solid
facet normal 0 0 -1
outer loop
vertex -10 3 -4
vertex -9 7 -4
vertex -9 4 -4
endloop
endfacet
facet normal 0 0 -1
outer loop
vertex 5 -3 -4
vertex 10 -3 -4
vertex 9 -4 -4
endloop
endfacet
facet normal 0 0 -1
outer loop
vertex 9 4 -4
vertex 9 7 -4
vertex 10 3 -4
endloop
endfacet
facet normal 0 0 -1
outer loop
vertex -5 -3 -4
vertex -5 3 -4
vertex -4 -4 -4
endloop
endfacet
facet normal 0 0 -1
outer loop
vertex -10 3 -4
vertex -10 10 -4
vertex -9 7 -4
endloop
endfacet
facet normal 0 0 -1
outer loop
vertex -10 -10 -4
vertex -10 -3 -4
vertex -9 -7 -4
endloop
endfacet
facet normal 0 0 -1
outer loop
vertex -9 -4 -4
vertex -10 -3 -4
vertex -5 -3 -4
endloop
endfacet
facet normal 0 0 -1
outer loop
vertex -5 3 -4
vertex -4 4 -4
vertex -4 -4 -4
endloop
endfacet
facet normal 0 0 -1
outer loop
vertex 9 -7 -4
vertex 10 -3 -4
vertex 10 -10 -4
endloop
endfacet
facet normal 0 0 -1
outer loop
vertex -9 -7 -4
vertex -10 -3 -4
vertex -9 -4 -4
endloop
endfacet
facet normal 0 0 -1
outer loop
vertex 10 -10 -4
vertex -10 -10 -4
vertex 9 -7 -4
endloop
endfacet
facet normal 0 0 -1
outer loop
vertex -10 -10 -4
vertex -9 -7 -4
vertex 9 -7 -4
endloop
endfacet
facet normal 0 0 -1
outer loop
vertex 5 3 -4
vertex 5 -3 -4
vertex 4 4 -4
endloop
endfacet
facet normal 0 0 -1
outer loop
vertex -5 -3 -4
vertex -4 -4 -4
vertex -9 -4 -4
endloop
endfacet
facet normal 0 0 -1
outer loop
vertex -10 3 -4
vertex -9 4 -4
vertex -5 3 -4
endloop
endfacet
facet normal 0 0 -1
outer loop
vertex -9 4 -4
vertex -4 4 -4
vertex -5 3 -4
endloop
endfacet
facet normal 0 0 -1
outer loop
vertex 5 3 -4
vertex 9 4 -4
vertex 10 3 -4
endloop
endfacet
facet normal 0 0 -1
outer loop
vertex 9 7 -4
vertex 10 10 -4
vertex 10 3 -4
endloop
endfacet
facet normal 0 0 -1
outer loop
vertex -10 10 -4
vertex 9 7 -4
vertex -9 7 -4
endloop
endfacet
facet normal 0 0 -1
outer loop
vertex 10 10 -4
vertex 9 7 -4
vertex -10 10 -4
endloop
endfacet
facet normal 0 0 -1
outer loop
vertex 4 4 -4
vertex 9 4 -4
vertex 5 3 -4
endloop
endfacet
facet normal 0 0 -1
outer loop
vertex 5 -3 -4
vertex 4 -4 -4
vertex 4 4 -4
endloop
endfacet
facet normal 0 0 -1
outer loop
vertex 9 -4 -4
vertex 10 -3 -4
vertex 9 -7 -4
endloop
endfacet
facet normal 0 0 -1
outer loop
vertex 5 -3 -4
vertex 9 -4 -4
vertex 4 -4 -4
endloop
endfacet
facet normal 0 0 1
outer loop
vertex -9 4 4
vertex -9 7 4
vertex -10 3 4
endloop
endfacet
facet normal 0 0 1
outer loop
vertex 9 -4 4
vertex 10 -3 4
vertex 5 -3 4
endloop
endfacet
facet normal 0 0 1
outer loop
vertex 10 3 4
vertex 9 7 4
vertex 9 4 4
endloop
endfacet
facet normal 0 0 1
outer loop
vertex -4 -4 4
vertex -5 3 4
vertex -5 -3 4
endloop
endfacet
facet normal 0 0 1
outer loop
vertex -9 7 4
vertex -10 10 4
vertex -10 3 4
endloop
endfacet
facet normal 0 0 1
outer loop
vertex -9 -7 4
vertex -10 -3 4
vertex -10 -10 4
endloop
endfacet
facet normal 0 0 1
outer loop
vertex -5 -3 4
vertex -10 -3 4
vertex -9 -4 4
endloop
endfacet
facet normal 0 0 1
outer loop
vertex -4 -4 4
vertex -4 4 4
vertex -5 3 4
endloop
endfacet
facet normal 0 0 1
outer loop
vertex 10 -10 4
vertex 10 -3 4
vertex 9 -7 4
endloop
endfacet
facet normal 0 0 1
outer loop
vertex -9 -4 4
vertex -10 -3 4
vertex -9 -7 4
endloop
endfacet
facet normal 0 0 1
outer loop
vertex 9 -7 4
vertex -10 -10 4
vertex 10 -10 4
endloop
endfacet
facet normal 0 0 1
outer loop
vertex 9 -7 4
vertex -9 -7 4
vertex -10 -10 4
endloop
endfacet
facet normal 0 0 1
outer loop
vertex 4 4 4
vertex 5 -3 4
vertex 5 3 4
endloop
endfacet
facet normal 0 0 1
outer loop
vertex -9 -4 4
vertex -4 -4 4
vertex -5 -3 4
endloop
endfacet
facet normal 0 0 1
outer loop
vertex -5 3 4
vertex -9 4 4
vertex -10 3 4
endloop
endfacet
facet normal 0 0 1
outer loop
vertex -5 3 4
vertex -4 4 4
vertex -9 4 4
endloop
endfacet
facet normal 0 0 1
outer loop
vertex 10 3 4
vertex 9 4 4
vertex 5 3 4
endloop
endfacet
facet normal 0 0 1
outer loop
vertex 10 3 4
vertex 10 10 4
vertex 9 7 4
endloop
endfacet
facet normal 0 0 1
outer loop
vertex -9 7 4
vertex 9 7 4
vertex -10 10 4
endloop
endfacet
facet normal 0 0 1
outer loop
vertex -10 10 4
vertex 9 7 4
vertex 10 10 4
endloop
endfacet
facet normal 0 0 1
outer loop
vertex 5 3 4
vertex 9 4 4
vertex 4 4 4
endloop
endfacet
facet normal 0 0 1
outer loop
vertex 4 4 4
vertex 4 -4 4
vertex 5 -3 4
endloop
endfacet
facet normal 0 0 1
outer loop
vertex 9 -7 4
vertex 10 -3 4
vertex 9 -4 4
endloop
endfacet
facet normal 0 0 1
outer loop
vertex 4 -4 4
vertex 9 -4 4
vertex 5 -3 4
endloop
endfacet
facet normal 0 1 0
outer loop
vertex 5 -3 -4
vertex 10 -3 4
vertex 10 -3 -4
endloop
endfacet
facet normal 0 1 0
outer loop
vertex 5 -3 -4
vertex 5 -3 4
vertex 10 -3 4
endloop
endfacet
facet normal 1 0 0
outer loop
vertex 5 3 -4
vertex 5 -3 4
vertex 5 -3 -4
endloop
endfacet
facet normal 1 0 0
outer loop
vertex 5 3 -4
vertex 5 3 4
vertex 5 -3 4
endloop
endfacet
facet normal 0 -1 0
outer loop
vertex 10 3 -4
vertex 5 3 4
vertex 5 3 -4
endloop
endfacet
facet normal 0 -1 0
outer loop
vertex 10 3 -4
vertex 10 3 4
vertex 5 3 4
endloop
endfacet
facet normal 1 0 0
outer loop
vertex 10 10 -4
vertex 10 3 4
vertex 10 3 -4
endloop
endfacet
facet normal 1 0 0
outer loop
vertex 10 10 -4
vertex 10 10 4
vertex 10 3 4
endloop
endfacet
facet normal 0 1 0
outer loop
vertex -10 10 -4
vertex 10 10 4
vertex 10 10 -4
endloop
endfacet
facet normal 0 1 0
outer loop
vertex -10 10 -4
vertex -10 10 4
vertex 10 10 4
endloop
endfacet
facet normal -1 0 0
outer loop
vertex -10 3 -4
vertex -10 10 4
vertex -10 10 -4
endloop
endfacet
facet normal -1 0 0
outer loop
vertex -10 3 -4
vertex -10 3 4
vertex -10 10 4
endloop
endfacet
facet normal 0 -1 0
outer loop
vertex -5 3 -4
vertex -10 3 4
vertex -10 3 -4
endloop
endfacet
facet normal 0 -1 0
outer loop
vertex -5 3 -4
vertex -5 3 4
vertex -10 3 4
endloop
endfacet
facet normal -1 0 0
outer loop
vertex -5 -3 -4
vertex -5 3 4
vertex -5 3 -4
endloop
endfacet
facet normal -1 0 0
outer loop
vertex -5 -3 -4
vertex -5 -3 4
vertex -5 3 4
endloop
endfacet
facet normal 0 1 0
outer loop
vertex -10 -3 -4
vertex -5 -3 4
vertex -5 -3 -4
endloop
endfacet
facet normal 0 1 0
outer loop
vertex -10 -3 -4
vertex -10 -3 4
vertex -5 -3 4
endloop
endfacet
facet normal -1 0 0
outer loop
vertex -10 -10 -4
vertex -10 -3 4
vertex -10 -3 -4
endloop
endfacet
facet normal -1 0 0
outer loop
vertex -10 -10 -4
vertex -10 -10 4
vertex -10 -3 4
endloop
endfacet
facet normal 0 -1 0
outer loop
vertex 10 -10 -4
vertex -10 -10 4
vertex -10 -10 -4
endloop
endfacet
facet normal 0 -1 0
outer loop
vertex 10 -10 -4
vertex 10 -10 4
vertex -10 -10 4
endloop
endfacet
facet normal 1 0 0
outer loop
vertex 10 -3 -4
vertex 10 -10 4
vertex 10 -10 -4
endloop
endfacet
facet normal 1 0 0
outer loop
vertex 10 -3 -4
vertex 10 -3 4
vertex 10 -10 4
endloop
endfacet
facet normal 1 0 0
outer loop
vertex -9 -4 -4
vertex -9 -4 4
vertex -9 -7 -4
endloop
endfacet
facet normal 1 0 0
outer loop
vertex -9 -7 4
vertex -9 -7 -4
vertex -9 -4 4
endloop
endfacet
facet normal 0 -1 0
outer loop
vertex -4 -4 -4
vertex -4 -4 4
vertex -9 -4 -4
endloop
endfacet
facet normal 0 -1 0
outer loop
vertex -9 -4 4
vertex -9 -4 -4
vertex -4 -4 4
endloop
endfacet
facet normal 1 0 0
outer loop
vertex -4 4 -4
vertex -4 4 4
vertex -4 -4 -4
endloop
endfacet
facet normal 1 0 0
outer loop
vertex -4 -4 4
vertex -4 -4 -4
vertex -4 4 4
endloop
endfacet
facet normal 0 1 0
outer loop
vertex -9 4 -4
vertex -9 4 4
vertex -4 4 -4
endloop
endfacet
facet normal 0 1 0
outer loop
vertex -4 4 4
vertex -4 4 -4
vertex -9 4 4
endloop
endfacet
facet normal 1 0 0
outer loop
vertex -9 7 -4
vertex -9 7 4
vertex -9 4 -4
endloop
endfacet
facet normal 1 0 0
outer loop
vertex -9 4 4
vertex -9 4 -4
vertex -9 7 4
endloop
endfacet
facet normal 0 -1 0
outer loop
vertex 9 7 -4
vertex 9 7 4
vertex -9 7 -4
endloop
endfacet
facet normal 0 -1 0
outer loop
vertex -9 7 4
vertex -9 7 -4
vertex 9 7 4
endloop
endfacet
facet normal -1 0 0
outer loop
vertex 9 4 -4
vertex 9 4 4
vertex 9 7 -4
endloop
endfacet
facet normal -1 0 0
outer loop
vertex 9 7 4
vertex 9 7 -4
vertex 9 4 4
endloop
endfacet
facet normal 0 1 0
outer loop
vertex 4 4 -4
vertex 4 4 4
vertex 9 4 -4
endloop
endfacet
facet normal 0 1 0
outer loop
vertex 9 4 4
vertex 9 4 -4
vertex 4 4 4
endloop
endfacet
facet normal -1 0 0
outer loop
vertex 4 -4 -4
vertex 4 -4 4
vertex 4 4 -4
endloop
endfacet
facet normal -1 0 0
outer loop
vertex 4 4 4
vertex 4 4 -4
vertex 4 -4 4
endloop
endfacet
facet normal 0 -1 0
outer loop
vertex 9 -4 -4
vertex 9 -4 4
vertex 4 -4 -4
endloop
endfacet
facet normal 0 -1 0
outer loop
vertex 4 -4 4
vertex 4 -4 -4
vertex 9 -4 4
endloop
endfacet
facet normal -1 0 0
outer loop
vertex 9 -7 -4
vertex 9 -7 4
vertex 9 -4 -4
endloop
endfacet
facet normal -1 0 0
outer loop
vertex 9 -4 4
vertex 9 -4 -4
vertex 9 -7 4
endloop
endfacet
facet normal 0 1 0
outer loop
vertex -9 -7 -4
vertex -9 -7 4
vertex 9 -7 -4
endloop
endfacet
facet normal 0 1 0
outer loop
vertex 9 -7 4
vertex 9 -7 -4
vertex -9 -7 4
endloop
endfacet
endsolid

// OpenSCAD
module flexureSolid2D(width, height, wCut, hStalk) {

	//cube from which flexure will be cut
	hEnd = 0.5*(height - hStalk);
	wStalk = width - 2*wCut;

	difference() {
		difference() {
			square(size=[width, height], center=true);
			translate([-(wCut + wStalk)/2, 0, 0]) {
				square(size=[wCut, hStalk], center=true);
			}
		}

		translate([(wCut + wStalk)/2, 0, 0]) {
			square(size=[wCut, hStalk], center=true);
		}
	}	
}

module flexure(wCut, thickness, depth)
{
	width = 20;
    thickness = 20*thickness;
    depth = 20*depth;
    
	height = width;
	wCut = width*wCut;
	thickness = width*thickness;
	thickness2 = thickness;
	cavitySize = (0.7*height - 2*thickness)/4;
	hStalk2 = 2*cavitySize;

	echo("Thickness ", thickness2);
	echo("Stalk Height ", hStalk2);

	//deal with constraints
	linear_extrude(height = depth, center = true) {
		difference() {
			flexureSolid2D(width, height, wCut, hStalk2);
			flexureSolid2D(width-2*thickness, 0.7*height, wCut, hStalk2+2*thickness2);
		}
	}
}


flexure(0.25,0.05,0.4); 
